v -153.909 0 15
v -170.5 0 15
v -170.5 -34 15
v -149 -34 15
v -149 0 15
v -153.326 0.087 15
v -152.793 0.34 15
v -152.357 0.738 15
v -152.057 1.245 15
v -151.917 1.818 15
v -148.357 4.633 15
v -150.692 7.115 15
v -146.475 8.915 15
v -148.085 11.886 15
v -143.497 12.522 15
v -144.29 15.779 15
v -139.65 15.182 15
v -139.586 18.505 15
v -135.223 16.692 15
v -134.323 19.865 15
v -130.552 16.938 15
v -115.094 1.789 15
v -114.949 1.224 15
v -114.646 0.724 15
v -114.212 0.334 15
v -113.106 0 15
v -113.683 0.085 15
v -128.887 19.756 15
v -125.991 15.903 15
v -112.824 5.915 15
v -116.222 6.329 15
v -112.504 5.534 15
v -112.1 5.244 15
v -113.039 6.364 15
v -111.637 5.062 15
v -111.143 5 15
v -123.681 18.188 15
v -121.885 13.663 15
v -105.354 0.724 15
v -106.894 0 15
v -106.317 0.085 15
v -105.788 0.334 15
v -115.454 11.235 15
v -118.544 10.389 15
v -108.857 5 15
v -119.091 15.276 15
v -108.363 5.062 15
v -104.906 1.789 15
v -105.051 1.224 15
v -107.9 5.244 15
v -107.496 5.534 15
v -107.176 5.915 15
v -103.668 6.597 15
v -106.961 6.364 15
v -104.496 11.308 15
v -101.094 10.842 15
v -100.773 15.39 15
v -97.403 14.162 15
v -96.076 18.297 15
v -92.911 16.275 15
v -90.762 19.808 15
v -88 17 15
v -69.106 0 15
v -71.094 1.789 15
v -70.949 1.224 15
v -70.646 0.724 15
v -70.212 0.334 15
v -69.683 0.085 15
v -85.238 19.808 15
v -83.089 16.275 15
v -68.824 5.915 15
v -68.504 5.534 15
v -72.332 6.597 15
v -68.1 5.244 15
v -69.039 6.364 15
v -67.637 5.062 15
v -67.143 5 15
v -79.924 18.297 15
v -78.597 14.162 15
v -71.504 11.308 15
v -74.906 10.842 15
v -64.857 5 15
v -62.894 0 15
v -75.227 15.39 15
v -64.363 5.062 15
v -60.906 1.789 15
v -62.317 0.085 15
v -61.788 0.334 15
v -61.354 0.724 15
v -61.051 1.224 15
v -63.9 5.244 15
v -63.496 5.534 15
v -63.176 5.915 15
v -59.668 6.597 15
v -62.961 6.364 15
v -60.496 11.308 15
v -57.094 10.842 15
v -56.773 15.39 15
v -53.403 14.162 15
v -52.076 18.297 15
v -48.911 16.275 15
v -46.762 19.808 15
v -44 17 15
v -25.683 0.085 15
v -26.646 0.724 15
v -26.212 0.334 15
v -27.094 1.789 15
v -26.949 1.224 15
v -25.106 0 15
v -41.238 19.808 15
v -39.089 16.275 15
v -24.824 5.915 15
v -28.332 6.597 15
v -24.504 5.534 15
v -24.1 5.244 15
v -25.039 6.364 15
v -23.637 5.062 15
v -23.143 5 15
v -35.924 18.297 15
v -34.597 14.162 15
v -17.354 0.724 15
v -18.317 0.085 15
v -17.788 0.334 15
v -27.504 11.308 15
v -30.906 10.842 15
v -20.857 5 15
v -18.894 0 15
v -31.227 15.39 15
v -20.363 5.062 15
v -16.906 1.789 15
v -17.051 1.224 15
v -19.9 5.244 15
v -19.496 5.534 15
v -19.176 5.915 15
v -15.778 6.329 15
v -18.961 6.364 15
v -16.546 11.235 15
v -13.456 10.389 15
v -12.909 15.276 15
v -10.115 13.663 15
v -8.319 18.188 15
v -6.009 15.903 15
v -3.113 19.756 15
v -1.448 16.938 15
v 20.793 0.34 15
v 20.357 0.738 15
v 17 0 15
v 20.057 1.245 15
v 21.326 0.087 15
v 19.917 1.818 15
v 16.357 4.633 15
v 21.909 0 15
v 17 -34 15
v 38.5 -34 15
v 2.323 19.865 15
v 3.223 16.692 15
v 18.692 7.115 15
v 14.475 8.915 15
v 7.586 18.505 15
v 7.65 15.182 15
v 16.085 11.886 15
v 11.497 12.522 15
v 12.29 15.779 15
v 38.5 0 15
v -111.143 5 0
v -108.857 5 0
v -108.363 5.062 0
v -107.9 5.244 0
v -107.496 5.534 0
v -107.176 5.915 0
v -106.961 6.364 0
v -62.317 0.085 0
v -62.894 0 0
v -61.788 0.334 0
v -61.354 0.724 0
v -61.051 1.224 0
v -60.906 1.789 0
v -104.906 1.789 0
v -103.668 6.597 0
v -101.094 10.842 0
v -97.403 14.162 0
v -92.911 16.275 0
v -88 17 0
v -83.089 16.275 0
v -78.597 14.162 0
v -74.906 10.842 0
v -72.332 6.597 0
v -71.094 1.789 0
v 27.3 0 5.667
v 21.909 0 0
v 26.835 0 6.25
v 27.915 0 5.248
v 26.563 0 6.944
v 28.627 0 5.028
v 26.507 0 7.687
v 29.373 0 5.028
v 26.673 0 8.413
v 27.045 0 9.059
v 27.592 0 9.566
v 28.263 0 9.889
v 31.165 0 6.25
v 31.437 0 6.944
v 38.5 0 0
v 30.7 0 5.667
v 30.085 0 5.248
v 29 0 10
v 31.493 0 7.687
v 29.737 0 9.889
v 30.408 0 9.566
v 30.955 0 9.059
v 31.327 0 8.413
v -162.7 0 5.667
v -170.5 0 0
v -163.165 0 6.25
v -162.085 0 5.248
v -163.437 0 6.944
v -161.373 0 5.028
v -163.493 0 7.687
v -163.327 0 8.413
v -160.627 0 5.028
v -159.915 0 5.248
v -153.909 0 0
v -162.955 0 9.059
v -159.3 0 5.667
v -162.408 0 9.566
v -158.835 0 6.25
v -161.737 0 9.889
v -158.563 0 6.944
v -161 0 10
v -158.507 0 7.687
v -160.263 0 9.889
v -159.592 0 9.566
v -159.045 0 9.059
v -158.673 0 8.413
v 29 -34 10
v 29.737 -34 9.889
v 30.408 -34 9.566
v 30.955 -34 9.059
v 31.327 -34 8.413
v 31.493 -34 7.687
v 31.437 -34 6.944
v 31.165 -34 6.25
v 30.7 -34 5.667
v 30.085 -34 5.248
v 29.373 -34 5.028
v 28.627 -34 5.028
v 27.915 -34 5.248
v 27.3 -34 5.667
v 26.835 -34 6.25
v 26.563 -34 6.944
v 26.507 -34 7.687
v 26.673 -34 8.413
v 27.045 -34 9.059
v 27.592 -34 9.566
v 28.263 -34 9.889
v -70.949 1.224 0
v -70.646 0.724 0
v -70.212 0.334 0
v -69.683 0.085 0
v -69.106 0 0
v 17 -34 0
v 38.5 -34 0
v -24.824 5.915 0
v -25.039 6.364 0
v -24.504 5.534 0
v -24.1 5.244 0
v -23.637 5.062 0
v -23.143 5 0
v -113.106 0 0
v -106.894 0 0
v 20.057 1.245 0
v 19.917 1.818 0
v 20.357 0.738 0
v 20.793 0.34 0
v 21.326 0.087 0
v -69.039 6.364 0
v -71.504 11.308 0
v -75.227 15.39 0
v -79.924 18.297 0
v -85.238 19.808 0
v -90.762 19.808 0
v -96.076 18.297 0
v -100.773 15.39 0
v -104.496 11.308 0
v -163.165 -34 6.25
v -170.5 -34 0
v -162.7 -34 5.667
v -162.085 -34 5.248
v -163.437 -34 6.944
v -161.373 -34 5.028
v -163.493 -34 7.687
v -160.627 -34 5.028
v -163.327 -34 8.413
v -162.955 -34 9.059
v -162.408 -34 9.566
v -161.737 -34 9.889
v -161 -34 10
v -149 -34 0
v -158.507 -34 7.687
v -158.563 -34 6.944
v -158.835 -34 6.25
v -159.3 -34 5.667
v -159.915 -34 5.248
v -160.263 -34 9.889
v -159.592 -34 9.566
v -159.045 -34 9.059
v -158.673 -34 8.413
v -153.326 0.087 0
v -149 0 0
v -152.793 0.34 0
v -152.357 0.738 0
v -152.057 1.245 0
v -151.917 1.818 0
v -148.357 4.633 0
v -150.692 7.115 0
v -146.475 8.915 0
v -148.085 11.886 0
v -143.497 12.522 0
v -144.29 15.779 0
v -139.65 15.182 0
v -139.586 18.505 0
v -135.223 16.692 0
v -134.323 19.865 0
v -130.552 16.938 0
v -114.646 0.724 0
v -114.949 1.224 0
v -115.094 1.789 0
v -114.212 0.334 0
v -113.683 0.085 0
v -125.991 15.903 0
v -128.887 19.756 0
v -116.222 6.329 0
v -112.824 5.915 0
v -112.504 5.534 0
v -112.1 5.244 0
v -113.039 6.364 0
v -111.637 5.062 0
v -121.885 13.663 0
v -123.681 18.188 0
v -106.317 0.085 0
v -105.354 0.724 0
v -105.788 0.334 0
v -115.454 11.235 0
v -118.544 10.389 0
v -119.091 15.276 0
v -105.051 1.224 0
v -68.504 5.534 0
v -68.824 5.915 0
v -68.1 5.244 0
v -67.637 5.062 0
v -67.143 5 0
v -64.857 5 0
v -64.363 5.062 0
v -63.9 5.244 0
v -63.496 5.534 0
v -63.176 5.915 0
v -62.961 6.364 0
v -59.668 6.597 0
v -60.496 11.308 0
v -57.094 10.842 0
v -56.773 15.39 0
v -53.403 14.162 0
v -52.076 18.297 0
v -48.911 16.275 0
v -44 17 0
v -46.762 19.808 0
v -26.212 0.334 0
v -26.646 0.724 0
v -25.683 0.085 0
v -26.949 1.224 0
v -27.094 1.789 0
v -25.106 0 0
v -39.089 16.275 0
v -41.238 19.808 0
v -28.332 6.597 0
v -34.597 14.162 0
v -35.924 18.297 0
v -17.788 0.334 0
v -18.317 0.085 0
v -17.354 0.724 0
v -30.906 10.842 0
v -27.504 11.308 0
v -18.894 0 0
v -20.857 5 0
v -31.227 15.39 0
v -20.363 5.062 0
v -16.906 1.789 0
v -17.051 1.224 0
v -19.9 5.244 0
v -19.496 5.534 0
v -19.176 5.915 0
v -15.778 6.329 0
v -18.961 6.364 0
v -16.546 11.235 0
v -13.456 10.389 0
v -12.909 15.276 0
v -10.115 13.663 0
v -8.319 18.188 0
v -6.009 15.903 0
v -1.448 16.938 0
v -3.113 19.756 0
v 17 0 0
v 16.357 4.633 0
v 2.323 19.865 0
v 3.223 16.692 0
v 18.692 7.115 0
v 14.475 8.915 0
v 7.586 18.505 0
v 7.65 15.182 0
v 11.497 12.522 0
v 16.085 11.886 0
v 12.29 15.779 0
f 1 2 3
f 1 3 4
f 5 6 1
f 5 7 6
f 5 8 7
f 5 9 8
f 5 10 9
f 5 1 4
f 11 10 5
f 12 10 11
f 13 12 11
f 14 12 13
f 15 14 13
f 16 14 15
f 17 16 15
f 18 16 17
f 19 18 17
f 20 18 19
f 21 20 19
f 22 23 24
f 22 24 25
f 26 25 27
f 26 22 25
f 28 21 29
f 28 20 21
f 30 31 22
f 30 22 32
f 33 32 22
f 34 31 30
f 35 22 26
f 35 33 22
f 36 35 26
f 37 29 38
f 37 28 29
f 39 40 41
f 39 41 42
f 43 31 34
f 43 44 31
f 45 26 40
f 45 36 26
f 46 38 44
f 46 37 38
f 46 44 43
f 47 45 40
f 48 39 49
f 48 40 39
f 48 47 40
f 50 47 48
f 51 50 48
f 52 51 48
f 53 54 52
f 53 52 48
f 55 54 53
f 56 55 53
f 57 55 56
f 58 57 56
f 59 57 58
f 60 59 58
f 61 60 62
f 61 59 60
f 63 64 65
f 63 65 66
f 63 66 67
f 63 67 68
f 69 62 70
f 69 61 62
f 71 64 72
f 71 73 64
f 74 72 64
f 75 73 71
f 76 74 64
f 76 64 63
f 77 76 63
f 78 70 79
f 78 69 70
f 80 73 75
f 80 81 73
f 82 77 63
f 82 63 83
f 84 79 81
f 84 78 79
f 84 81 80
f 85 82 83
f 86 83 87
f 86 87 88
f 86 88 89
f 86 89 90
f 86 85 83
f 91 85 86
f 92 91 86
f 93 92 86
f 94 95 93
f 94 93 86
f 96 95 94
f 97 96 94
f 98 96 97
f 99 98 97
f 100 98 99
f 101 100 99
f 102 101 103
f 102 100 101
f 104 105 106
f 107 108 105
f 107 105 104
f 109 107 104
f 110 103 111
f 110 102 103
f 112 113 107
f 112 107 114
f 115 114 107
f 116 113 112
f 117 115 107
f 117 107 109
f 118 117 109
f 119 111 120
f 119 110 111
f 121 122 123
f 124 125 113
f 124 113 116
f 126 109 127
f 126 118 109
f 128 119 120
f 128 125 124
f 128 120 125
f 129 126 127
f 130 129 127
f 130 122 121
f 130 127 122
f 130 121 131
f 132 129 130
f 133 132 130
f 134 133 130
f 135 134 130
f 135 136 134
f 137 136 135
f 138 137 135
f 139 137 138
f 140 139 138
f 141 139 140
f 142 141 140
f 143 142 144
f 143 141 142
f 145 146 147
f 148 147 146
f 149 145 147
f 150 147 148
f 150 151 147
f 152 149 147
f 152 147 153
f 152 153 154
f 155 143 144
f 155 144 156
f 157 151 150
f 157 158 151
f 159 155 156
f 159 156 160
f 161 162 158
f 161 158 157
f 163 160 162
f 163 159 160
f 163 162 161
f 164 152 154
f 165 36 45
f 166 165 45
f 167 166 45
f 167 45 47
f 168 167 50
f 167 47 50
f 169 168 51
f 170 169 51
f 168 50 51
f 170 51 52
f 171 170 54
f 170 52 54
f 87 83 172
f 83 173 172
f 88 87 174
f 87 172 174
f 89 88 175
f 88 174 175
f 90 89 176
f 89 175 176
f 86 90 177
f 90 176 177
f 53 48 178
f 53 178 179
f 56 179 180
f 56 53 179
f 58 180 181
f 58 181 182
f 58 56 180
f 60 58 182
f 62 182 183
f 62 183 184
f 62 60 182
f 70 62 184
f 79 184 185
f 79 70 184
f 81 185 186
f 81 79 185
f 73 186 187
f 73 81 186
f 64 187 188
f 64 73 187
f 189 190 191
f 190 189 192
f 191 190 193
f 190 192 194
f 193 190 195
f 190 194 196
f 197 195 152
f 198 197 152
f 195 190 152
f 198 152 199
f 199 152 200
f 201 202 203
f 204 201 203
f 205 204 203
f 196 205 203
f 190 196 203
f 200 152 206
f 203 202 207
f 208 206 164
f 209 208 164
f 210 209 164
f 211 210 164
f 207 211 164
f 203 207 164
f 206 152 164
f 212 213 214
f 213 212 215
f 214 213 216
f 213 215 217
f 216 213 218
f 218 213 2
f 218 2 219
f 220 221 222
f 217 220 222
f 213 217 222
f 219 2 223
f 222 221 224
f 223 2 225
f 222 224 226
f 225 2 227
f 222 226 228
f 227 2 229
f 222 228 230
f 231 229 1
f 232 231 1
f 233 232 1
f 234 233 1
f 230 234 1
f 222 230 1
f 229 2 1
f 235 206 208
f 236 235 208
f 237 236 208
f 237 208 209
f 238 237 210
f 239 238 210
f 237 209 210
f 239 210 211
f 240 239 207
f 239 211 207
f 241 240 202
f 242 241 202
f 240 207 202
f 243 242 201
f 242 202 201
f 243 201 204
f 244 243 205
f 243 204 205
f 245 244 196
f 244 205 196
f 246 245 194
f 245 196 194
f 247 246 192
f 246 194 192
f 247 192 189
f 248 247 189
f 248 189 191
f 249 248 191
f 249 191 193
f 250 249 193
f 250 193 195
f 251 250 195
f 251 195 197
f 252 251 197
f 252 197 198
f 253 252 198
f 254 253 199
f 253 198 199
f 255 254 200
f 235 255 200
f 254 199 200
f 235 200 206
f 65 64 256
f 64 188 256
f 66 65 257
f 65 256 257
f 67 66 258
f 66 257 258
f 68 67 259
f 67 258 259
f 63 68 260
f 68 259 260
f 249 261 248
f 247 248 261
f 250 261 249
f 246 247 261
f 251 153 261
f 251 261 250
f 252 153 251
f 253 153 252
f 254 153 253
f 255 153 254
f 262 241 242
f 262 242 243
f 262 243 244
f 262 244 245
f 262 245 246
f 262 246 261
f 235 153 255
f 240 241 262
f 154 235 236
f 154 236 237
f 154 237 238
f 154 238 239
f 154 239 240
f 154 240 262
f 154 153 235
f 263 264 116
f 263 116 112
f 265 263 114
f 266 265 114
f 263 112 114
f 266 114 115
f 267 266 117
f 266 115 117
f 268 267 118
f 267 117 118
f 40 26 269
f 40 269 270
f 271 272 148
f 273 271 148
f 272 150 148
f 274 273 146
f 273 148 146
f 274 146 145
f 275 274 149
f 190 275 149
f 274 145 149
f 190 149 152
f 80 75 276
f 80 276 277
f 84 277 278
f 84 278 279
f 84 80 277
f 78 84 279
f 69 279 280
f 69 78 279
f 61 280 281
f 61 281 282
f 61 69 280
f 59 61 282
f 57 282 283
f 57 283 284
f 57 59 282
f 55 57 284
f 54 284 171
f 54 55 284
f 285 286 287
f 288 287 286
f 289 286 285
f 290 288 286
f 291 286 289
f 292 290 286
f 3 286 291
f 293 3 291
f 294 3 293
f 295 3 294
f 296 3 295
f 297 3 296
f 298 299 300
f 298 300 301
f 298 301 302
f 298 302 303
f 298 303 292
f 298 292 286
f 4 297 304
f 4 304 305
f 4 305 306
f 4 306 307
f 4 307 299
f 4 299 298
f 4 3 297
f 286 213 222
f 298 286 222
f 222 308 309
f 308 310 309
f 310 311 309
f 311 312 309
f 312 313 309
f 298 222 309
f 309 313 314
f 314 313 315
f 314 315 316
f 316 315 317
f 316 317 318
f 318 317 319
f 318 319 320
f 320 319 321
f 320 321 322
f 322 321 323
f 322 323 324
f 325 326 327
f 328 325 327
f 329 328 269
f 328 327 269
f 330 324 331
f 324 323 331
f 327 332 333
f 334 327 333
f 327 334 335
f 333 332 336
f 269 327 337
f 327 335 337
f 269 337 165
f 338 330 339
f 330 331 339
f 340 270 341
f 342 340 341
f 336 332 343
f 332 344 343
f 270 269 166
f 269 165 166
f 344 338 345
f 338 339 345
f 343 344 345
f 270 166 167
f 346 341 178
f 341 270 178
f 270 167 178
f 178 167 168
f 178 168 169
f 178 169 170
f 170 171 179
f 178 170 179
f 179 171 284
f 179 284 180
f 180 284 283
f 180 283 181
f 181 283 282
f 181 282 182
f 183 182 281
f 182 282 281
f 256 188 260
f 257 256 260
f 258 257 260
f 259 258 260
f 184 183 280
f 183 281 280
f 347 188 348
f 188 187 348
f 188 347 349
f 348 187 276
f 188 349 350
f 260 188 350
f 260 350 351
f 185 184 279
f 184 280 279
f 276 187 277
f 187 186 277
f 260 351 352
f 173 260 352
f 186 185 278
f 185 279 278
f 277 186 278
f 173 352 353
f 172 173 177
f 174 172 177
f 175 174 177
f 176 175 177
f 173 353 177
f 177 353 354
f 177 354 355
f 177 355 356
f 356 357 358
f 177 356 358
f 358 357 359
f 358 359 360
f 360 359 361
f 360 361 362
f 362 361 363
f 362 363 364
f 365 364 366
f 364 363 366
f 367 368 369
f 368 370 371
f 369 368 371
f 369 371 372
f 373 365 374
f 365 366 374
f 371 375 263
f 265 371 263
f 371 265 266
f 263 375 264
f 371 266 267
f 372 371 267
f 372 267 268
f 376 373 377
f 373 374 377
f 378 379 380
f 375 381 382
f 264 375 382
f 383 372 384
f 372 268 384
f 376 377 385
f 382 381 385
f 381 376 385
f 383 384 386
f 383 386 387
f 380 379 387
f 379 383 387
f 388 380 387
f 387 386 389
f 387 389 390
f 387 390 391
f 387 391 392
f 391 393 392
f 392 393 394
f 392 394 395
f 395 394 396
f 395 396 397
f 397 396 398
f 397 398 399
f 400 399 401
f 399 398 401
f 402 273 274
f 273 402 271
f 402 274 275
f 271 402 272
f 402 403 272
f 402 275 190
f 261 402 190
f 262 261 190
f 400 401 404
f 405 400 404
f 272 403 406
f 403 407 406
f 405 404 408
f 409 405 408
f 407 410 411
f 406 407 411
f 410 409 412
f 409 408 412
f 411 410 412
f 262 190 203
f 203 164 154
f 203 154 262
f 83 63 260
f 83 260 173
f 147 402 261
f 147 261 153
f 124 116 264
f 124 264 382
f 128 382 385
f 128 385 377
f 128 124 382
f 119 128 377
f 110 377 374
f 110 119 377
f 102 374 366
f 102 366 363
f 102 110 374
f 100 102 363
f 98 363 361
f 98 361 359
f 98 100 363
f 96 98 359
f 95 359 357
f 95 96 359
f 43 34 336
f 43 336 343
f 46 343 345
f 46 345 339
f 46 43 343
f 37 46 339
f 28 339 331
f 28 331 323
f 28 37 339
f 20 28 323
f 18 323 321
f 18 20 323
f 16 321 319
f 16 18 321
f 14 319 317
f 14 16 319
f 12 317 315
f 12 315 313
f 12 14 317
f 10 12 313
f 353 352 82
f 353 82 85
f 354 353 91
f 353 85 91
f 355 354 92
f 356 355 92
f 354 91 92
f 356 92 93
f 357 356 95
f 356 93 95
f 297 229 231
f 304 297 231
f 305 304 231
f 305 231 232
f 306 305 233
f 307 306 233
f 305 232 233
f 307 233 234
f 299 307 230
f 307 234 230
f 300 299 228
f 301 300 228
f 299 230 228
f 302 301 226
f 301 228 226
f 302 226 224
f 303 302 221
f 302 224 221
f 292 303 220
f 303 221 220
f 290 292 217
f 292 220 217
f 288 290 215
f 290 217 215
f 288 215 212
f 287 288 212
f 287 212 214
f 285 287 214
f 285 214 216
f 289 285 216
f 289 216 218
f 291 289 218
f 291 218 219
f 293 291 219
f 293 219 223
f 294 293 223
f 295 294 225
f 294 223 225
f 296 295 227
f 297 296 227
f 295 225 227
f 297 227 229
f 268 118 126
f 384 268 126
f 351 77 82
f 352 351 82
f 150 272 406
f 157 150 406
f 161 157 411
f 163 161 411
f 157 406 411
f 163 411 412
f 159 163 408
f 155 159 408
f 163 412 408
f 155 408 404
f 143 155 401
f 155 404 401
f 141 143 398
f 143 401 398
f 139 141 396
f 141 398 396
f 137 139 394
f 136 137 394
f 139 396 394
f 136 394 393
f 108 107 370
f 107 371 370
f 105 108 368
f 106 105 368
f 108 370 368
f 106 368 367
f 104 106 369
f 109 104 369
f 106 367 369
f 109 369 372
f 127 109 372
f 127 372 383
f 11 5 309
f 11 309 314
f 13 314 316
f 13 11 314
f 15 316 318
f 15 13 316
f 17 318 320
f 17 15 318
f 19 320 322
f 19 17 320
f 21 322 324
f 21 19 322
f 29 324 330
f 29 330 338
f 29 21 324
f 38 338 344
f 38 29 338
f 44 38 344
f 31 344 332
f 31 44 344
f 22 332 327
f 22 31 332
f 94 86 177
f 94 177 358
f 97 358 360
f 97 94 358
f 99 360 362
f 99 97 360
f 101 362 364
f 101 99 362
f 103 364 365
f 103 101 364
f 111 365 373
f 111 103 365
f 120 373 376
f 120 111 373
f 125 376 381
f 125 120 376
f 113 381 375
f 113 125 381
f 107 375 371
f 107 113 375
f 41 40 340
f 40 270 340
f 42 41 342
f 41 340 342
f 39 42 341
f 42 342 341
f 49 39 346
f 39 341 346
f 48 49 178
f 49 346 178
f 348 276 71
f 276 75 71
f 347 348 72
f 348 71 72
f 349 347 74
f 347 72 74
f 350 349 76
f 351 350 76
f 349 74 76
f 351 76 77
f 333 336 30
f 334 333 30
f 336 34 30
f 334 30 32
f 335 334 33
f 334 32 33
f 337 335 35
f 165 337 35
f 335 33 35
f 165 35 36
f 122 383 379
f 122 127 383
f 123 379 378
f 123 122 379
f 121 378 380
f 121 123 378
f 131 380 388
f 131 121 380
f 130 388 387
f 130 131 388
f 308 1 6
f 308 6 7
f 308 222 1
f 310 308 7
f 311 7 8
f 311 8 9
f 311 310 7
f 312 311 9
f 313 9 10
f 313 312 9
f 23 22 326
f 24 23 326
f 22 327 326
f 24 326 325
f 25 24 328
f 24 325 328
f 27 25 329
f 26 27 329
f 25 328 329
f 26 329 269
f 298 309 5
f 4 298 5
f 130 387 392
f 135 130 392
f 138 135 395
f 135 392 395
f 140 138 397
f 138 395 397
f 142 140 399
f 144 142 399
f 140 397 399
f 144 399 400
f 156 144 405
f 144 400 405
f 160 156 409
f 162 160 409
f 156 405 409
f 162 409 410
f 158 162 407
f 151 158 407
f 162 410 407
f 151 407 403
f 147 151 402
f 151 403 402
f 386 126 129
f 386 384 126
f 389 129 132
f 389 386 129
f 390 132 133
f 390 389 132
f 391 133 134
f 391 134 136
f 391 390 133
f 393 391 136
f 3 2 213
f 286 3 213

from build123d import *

# Parameters (mm, degrees)
EXTRUDE_1_DEPTH     = 15
EXTRUDE_2_DEPTH     = 15
EXTRUDE_2_2_DEPTH   = 15
EXTRUDE_2_3_DEPTH   = 15
SKETCH_3_W          = 7
SKETCH_3_H          = 15
EXTRUDE_3_DEPTH     = 5
SKETCH_4_W          = 40
SKETCH_4_H          = 15
EXTRUDE_4_DEPTH     = 34
SKETCH_6_R          = 2.5
CUT_EXTRUDE_2_DEPTH = 34
SKETCH_7_W          = 18.5
SKETCH_7_H          = 15
CUT_EXTRUDE_3_DEPTH = 100
FILLET_1_R          = 2
FILLET_2_R          = 2


with BuildPart() as part:
    # 草图1 → 凸台-拉伸1 (new body)
    with BuildSketch(Plane.XY):
        with BuildLine():
            Line((-20, 0), (-17, 0))
            ThreePointArc((-17, 0), (0, 17), (17, 0))
            Line((17, 0), (20, 0))
            ThreePointArc((20, 0), (0, 20), (-20, 0))
        make_face()
    extrude(amount=EXTRUDE_1_DEPTH)



with BuildPart() as body_2:
    # 草图2 → 凸台-拉伸2 (new body)
    with BuildSketch(Plane.XY.offset(15)):
        with BuildLine():
            Line((-152, 0), (-149, 0))
            ThreePointArc((-149, 0), (-132, 17), (-115, 0))
            Line((-115, 0), (-112, 0))
            ThreePointArc((-112, 0), (-132, 20), (-152, 0))
        make_face()
    extrude(amount=-EXTRUDE_2_DEPTH)


with BuildPart() as body_3:
    # 草图2 → Extrude 2 2 (new body)
    with BuildSketch(Plane.XY.offset(15)):
        with BuildLine():
            Line((-71, 0), (-68, 0))
            ThreePointArc((-68, 0), (-88, 20), (-108, 0))
            Line((-108, 0), (-105, 0))
            ThreePointArc((-105, 0), (-88, 17), (-71, 0))
        make_face()
    extrude(amount=-EXTRUDE_2_2_DEPTH)


with BuildPart() as body_4:
    # 草图2 → Extrude 2 3 (new body)
    with BuildSketch(Plane.XY.offset(15)):
        with BuildLine():
            Line((-27, 0), (-24, 0))
            ThreePointArc((-24, 0), (-44, 20), (-64, 0))
            Line((-64, 0), (-61, 0))
            ThreePointArc((-61, 0), (-44, 17), (-27, 0))
        make_face()
    extrude(amount=-EXTRUDE_2_3_DEPTH)


with BuildPart() as part_1:
    add(part.part)

    add(body_2.part)  # 凸台-拉伸3 merges body 2

    add(body_3.part)  # 凸台-拉伸3 merges body 3

    add(body_4.part)  # 凸台-拉伸3 merges body 4
    # 草图3 → 凸台-拉伸3 (add)
    with BuildSketch(Plane.XZ):
        with Locations((-110, 7.5)):
            Rectangle(SKETCH_3_W, SKETCH_3_H)
        with Locations((-66, 7.5)):
            Rectangle(SKETCH_3_W, SKETCH_3_H)
        with Locations((-22, 7.5)):
            Rectangle(SKETCH_3_W, SKETCH_3_H)
    extrude(amount=-EXTRUDE_3_DEPTH)

    # 草图4 → 凸台-拉伸4 (add)
    with BuildSketch(Plane.XZ):
        with Locations((37, 7.5)):
            Rectangle(SKETCH_4_W, SKETCH_4_H)
        with Locations((-169, 7.5)):
            Rectangle(SKETCH_4_W, SKETCH_4_H)
    extrude(amount=EXTRUDE_4_DEPTH)

    # 草图6 → 切除-拉伸2 (cut)
    with BuildSketch(Plane(origin=(0, 0, 0), x_dir=(1, 0, 0), z_dir=(0, 1, 0))):
        with Locations(Location((29, -7.5, 0), (0, 0, 270))):
            Circle(SKETCH_6_R)
        with Locations(Location((-161, -7.5, 0), (0, 0, 270))):
            Circle(SKETCH_6_R)
    extrude(amount=-CUT_EXTRUDE_2_DEPTH, mode=Mode.SUBTRACT)

    # 草图7 → 切除-拉伸3 (cut)
    with BuildSketch(Plane(origin=(0, 0, 0), x_dir=(1, 0, 0), z_dir=(0, 1, 0))):
        with Locations((-179.75, -7.5)):
            Rectangle(SKETCH_7_W, SKETCH_7_H)
        with Locations((47.75, -7.5)):
            Rectangle(SKETCH_7_W, SKETCH_7_H)
    extrude(amount=-CUT_EXTRUDE_3_DEPTH, mode=Mode.SUBTRACT)

    # 圆角1
    fillet_1_edges = [part_1.edges().sort_by_distance(p)[0] for p in [
        (-112.635083269, 5, 7.5),
        (-152, 0, 7.5),
        (-19.364916731, 5, 7.5),
        (-24.635083269, 5, 7.5),
        (-63.364916731, 5, 7.5),
        (-68.635083269, 5, 7.5),
        (20, 0, 7.5),
        (-107.364916731, 5, 7.5),
    ]]
    fillet(fillet_1_edges, radius=FILLET_1_R)

    # 圆角2
    fillet_2_edges = [part_1.edges().sort_by_distance(p)[0] for p in [
        (-115, 0, 7.5),
        (-27, 0, 7.5),
        (-61, 0, 7.5),
        (-71, 0, 7.5),
        (-105, 0, 7.5),
        (-17, 0, 7.5),
    ]]
    fillet(fillet_2_edges, radius=FILLET_2_R)


solid = part_1.part
